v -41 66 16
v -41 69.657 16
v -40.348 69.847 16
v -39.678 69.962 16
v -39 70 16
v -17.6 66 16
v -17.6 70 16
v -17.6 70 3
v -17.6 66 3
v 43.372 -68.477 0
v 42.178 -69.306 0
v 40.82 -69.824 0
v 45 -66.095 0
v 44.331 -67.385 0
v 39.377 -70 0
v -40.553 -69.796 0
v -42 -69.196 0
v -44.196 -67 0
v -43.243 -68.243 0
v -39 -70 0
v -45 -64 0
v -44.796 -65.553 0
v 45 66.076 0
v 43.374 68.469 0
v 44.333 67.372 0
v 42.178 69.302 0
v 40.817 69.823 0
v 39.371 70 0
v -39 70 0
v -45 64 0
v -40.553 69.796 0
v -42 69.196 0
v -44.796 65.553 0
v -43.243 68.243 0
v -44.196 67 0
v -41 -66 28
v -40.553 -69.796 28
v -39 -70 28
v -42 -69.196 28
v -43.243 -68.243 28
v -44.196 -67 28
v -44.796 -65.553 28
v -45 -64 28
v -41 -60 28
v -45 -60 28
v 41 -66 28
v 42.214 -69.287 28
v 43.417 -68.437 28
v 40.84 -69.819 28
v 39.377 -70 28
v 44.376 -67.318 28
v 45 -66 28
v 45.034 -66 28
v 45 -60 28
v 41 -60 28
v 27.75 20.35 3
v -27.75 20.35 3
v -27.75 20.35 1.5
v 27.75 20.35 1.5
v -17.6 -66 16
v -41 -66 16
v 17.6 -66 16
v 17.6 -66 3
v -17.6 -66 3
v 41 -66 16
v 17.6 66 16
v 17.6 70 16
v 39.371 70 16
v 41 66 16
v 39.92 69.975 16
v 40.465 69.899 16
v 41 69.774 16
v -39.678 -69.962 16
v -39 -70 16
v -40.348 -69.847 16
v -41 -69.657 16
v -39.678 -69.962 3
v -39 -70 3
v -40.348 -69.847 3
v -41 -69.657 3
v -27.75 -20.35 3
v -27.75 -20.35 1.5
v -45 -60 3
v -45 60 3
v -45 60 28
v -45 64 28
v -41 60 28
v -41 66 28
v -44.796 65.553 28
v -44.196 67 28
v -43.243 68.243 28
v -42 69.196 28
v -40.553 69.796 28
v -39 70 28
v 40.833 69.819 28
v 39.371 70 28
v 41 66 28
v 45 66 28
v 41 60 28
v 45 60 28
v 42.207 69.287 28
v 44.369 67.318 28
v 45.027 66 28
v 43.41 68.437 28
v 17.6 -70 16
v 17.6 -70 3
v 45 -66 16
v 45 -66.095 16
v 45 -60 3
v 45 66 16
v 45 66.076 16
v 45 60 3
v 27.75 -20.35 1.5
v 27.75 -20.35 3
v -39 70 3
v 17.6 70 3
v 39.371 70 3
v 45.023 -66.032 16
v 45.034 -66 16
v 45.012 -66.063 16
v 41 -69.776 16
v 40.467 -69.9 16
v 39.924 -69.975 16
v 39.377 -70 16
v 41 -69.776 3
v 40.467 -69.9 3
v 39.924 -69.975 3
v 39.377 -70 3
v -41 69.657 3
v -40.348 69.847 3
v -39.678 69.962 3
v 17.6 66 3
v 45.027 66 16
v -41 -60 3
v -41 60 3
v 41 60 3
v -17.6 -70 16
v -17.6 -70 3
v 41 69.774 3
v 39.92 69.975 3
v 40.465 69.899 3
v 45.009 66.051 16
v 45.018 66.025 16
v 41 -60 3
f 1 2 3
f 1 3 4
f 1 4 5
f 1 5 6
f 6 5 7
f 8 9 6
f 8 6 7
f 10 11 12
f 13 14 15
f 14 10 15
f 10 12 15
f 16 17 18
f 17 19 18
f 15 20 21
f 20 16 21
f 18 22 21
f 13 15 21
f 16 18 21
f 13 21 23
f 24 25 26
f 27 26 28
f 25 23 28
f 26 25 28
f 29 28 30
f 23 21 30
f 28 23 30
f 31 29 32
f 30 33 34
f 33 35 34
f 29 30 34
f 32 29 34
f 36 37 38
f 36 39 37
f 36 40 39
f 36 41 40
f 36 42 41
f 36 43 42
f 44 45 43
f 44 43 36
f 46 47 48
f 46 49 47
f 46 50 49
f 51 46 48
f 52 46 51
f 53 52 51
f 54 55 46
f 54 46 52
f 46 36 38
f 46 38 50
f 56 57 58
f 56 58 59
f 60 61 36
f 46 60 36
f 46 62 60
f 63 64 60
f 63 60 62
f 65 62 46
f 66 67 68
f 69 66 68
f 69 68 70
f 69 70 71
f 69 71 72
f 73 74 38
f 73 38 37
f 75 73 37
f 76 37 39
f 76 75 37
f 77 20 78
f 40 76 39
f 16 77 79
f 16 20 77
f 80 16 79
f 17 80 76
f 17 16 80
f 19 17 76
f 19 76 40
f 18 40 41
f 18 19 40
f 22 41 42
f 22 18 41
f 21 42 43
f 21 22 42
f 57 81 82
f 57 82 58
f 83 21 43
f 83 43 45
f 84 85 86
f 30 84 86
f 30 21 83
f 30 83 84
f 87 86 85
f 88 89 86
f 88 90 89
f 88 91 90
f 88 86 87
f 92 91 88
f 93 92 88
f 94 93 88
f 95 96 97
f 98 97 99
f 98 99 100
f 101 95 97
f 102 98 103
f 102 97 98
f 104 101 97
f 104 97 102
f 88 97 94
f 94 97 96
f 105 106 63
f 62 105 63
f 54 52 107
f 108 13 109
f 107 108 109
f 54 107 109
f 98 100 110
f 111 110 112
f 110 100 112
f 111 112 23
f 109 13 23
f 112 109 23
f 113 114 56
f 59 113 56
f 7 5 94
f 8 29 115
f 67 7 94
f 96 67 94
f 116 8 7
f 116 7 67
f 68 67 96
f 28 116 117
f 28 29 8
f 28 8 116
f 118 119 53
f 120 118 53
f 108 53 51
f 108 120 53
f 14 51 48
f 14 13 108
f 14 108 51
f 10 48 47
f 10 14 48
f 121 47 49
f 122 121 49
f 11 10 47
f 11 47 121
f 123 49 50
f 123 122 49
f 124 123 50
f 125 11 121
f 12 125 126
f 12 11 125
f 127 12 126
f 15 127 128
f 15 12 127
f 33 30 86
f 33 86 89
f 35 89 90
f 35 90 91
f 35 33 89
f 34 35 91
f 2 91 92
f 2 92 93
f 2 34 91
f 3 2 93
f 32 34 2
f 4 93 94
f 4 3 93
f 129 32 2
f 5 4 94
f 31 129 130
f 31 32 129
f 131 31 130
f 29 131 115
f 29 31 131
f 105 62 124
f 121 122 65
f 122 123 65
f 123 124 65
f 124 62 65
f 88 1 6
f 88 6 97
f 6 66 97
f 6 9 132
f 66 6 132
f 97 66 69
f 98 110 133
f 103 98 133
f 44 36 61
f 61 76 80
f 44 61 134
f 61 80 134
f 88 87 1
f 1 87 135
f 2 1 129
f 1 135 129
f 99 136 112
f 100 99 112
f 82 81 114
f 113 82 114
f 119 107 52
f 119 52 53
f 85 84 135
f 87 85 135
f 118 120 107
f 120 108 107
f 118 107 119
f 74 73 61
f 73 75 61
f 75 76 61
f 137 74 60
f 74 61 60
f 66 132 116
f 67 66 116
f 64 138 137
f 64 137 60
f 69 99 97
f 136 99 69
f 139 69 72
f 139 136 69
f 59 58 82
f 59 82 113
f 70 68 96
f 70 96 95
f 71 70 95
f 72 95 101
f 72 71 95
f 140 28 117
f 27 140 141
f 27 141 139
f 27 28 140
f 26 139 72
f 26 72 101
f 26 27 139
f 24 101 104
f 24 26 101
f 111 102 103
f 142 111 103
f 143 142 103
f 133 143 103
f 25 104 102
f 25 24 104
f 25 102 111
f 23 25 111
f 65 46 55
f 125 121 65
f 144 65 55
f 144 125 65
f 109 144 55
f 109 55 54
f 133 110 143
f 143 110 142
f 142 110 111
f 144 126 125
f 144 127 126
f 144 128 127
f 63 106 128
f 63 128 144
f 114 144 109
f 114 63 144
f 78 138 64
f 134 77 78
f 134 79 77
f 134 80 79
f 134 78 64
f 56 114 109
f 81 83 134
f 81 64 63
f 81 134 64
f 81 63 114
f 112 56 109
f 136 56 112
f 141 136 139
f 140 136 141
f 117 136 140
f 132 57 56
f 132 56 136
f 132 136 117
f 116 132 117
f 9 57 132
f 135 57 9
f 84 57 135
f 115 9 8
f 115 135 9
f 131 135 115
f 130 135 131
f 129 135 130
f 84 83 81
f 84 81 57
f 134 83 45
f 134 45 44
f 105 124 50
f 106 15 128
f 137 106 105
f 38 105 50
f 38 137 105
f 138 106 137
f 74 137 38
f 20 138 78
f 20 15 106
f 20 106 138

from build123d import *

# Parameters (mm, degrees)
SKETCH1_W           = 140
SKETCH1_H           = 90
BOSS_EXTRUDE1_DEPTH = 3
SKETCH2_W           = 4
SKETCH2_H           = 4
SKETCH2_W_2         = 35.2
BOSS_EXTRUDE2_DEPTH = 25
SKETCH4_W           = 55.5
SKETCH4_H           = 40.7
CUT_EXTRUDE1_DEPTH  = 1.5
SKETCH5_W           = 90.034346747
SKETCH5_H           = 4
SKETCH5_W_2         = 90.027377931
BOSS_EXTRUDE3_DEPTH = 12
SKETCH8_W           = 4
SKETCH8_H           = 10
BOSS_EXTRUDE5_DEPTH = 25
FILLET1_START       = -1
FILLET1_DEPTH       = 29


with BuildPart() as part:
    # Sketch1 → Boss-Extrude1 (new body)
    with BuildSketch(Plane(origin=(0, 0, 0), x_dir=(0, 1, 0), z_dir=(0, 0, 1))):
        Rectangle(SKETCH1_W, SKETCH1_H)
    extrude(amount=BOSS_EXTRUDE1_DEPTH)

    # Sketch2 → Boss-Extrude2 (add)
    with BuildSketch(Plane.XY.offset(3)):
        with Locations((-43, 68)):
            Rectangle(SKETCH2_W, SKETCH2_H)
        with Locations((43, 68)):
            Rectangle(SKETCH2_W, SKETCH2_H)
        with Locations((43, -68)):
            Rectangle(SKETCH2_W, SKETCH2_H)
        with Locations((-43, -68)):
            Rectangle(SKETCH2_W, SKETCH2_H)
        with Locations((0, 68)):
            Rectangle(SKETCH2_W_2, SKETCH2_H)
        with Locations((0, -68)):
            Rectangle(SKETCH2_W_2, SKETCH2_H)
    extrude(amount=BOSS_EXTRUDE2_DEPTH)

    # Sketch4 → Cut-Extrude1 (cut)
    with BuildSketch(Plane.XY.offset(3)):
        Rectangle(SKETCH4_W, SKETCH4_H)
    extrude(amount=-CUT_EXTRUDE1_DEPTH, mode=Mode.SUBTRACT)

    # Sketch5 → Boss-Extrude3 (add)
    with BuildSketch(Plane.XY.offset(28)):
        with Locations((0.017173374, -68)):
            Rectangle(SKETCH5_W, SKETCH5_H)
        with Locations((0.013688966, 68)):
            Rectangle(SKETCH5_W_2, SKETCH5_H)
    extrude(amount=-BOSS_EXTRUDE3_DEPTH)

    # Sketch8 → Boss-Extrude5 (add, through all)
    with BuildSketch(Plane.XY.offset(3)):
        with Locations((-43, 65)):
            Rectangle(SKETCH8_W, SKETCH8_H)
        with Locations((43, 65)):
            Rectangle(SKETCH8_W, SKETCH8_H)
        with Locations((43, -65)):
            Rectangle(SKETCH8_W, SKETCH8_H)
        with Locations((-43, -65)):
            Rectangle(SKETCH8_W, SKETCH8_H)
    extrude(amount=BOSS_EXTRUDE5_DEPTH)

    # Fillet1: read off the stored shape, not the designer's step
    # Fillet1 outline → Fillet1 (cut)
    with BuildSketch(Plane.XY.offset(FILLET1_START)):
        with BuildLine():
            Line((45.027377931, 66), (45.027377931, 70))
            Line((45.027377931, 70), (39.370523681, 70))
            ThreePointArc((39.370523681, 70), (42.834625296, 68.898979486), (45.027377931, 66))
        make_face()
        with BuildLine():
            Line((45.034346747, -70), (45.034346747, -66))
            ThreePointArc((45.034346747, -66), (42.841594113, -68.898979486), (39.377492498, -70))
            Line((39.377492498, -70), (45.034346747, -70))
        make_face()
        with BuildLine():
            Line((-39, 70), (-45, 70))
            Line((-45, 70), (-45, 64))
            ThreePointArc((-45, 64), (-43.242640687, 68.242640687), (-39, 70))
        make_face()
        with BuildLine():
            ThreePointArc((-39, -70), (-43.242640687, -68.242640687), (-45, -64))
            Line((-45, -64), (-45, -70))
            Line((-45, -70), (-39, -70))
        make_face()
    extrude(amount=FILLET1_DEPTH, mode=Mode.SUBTRACT)


solid = part.part
